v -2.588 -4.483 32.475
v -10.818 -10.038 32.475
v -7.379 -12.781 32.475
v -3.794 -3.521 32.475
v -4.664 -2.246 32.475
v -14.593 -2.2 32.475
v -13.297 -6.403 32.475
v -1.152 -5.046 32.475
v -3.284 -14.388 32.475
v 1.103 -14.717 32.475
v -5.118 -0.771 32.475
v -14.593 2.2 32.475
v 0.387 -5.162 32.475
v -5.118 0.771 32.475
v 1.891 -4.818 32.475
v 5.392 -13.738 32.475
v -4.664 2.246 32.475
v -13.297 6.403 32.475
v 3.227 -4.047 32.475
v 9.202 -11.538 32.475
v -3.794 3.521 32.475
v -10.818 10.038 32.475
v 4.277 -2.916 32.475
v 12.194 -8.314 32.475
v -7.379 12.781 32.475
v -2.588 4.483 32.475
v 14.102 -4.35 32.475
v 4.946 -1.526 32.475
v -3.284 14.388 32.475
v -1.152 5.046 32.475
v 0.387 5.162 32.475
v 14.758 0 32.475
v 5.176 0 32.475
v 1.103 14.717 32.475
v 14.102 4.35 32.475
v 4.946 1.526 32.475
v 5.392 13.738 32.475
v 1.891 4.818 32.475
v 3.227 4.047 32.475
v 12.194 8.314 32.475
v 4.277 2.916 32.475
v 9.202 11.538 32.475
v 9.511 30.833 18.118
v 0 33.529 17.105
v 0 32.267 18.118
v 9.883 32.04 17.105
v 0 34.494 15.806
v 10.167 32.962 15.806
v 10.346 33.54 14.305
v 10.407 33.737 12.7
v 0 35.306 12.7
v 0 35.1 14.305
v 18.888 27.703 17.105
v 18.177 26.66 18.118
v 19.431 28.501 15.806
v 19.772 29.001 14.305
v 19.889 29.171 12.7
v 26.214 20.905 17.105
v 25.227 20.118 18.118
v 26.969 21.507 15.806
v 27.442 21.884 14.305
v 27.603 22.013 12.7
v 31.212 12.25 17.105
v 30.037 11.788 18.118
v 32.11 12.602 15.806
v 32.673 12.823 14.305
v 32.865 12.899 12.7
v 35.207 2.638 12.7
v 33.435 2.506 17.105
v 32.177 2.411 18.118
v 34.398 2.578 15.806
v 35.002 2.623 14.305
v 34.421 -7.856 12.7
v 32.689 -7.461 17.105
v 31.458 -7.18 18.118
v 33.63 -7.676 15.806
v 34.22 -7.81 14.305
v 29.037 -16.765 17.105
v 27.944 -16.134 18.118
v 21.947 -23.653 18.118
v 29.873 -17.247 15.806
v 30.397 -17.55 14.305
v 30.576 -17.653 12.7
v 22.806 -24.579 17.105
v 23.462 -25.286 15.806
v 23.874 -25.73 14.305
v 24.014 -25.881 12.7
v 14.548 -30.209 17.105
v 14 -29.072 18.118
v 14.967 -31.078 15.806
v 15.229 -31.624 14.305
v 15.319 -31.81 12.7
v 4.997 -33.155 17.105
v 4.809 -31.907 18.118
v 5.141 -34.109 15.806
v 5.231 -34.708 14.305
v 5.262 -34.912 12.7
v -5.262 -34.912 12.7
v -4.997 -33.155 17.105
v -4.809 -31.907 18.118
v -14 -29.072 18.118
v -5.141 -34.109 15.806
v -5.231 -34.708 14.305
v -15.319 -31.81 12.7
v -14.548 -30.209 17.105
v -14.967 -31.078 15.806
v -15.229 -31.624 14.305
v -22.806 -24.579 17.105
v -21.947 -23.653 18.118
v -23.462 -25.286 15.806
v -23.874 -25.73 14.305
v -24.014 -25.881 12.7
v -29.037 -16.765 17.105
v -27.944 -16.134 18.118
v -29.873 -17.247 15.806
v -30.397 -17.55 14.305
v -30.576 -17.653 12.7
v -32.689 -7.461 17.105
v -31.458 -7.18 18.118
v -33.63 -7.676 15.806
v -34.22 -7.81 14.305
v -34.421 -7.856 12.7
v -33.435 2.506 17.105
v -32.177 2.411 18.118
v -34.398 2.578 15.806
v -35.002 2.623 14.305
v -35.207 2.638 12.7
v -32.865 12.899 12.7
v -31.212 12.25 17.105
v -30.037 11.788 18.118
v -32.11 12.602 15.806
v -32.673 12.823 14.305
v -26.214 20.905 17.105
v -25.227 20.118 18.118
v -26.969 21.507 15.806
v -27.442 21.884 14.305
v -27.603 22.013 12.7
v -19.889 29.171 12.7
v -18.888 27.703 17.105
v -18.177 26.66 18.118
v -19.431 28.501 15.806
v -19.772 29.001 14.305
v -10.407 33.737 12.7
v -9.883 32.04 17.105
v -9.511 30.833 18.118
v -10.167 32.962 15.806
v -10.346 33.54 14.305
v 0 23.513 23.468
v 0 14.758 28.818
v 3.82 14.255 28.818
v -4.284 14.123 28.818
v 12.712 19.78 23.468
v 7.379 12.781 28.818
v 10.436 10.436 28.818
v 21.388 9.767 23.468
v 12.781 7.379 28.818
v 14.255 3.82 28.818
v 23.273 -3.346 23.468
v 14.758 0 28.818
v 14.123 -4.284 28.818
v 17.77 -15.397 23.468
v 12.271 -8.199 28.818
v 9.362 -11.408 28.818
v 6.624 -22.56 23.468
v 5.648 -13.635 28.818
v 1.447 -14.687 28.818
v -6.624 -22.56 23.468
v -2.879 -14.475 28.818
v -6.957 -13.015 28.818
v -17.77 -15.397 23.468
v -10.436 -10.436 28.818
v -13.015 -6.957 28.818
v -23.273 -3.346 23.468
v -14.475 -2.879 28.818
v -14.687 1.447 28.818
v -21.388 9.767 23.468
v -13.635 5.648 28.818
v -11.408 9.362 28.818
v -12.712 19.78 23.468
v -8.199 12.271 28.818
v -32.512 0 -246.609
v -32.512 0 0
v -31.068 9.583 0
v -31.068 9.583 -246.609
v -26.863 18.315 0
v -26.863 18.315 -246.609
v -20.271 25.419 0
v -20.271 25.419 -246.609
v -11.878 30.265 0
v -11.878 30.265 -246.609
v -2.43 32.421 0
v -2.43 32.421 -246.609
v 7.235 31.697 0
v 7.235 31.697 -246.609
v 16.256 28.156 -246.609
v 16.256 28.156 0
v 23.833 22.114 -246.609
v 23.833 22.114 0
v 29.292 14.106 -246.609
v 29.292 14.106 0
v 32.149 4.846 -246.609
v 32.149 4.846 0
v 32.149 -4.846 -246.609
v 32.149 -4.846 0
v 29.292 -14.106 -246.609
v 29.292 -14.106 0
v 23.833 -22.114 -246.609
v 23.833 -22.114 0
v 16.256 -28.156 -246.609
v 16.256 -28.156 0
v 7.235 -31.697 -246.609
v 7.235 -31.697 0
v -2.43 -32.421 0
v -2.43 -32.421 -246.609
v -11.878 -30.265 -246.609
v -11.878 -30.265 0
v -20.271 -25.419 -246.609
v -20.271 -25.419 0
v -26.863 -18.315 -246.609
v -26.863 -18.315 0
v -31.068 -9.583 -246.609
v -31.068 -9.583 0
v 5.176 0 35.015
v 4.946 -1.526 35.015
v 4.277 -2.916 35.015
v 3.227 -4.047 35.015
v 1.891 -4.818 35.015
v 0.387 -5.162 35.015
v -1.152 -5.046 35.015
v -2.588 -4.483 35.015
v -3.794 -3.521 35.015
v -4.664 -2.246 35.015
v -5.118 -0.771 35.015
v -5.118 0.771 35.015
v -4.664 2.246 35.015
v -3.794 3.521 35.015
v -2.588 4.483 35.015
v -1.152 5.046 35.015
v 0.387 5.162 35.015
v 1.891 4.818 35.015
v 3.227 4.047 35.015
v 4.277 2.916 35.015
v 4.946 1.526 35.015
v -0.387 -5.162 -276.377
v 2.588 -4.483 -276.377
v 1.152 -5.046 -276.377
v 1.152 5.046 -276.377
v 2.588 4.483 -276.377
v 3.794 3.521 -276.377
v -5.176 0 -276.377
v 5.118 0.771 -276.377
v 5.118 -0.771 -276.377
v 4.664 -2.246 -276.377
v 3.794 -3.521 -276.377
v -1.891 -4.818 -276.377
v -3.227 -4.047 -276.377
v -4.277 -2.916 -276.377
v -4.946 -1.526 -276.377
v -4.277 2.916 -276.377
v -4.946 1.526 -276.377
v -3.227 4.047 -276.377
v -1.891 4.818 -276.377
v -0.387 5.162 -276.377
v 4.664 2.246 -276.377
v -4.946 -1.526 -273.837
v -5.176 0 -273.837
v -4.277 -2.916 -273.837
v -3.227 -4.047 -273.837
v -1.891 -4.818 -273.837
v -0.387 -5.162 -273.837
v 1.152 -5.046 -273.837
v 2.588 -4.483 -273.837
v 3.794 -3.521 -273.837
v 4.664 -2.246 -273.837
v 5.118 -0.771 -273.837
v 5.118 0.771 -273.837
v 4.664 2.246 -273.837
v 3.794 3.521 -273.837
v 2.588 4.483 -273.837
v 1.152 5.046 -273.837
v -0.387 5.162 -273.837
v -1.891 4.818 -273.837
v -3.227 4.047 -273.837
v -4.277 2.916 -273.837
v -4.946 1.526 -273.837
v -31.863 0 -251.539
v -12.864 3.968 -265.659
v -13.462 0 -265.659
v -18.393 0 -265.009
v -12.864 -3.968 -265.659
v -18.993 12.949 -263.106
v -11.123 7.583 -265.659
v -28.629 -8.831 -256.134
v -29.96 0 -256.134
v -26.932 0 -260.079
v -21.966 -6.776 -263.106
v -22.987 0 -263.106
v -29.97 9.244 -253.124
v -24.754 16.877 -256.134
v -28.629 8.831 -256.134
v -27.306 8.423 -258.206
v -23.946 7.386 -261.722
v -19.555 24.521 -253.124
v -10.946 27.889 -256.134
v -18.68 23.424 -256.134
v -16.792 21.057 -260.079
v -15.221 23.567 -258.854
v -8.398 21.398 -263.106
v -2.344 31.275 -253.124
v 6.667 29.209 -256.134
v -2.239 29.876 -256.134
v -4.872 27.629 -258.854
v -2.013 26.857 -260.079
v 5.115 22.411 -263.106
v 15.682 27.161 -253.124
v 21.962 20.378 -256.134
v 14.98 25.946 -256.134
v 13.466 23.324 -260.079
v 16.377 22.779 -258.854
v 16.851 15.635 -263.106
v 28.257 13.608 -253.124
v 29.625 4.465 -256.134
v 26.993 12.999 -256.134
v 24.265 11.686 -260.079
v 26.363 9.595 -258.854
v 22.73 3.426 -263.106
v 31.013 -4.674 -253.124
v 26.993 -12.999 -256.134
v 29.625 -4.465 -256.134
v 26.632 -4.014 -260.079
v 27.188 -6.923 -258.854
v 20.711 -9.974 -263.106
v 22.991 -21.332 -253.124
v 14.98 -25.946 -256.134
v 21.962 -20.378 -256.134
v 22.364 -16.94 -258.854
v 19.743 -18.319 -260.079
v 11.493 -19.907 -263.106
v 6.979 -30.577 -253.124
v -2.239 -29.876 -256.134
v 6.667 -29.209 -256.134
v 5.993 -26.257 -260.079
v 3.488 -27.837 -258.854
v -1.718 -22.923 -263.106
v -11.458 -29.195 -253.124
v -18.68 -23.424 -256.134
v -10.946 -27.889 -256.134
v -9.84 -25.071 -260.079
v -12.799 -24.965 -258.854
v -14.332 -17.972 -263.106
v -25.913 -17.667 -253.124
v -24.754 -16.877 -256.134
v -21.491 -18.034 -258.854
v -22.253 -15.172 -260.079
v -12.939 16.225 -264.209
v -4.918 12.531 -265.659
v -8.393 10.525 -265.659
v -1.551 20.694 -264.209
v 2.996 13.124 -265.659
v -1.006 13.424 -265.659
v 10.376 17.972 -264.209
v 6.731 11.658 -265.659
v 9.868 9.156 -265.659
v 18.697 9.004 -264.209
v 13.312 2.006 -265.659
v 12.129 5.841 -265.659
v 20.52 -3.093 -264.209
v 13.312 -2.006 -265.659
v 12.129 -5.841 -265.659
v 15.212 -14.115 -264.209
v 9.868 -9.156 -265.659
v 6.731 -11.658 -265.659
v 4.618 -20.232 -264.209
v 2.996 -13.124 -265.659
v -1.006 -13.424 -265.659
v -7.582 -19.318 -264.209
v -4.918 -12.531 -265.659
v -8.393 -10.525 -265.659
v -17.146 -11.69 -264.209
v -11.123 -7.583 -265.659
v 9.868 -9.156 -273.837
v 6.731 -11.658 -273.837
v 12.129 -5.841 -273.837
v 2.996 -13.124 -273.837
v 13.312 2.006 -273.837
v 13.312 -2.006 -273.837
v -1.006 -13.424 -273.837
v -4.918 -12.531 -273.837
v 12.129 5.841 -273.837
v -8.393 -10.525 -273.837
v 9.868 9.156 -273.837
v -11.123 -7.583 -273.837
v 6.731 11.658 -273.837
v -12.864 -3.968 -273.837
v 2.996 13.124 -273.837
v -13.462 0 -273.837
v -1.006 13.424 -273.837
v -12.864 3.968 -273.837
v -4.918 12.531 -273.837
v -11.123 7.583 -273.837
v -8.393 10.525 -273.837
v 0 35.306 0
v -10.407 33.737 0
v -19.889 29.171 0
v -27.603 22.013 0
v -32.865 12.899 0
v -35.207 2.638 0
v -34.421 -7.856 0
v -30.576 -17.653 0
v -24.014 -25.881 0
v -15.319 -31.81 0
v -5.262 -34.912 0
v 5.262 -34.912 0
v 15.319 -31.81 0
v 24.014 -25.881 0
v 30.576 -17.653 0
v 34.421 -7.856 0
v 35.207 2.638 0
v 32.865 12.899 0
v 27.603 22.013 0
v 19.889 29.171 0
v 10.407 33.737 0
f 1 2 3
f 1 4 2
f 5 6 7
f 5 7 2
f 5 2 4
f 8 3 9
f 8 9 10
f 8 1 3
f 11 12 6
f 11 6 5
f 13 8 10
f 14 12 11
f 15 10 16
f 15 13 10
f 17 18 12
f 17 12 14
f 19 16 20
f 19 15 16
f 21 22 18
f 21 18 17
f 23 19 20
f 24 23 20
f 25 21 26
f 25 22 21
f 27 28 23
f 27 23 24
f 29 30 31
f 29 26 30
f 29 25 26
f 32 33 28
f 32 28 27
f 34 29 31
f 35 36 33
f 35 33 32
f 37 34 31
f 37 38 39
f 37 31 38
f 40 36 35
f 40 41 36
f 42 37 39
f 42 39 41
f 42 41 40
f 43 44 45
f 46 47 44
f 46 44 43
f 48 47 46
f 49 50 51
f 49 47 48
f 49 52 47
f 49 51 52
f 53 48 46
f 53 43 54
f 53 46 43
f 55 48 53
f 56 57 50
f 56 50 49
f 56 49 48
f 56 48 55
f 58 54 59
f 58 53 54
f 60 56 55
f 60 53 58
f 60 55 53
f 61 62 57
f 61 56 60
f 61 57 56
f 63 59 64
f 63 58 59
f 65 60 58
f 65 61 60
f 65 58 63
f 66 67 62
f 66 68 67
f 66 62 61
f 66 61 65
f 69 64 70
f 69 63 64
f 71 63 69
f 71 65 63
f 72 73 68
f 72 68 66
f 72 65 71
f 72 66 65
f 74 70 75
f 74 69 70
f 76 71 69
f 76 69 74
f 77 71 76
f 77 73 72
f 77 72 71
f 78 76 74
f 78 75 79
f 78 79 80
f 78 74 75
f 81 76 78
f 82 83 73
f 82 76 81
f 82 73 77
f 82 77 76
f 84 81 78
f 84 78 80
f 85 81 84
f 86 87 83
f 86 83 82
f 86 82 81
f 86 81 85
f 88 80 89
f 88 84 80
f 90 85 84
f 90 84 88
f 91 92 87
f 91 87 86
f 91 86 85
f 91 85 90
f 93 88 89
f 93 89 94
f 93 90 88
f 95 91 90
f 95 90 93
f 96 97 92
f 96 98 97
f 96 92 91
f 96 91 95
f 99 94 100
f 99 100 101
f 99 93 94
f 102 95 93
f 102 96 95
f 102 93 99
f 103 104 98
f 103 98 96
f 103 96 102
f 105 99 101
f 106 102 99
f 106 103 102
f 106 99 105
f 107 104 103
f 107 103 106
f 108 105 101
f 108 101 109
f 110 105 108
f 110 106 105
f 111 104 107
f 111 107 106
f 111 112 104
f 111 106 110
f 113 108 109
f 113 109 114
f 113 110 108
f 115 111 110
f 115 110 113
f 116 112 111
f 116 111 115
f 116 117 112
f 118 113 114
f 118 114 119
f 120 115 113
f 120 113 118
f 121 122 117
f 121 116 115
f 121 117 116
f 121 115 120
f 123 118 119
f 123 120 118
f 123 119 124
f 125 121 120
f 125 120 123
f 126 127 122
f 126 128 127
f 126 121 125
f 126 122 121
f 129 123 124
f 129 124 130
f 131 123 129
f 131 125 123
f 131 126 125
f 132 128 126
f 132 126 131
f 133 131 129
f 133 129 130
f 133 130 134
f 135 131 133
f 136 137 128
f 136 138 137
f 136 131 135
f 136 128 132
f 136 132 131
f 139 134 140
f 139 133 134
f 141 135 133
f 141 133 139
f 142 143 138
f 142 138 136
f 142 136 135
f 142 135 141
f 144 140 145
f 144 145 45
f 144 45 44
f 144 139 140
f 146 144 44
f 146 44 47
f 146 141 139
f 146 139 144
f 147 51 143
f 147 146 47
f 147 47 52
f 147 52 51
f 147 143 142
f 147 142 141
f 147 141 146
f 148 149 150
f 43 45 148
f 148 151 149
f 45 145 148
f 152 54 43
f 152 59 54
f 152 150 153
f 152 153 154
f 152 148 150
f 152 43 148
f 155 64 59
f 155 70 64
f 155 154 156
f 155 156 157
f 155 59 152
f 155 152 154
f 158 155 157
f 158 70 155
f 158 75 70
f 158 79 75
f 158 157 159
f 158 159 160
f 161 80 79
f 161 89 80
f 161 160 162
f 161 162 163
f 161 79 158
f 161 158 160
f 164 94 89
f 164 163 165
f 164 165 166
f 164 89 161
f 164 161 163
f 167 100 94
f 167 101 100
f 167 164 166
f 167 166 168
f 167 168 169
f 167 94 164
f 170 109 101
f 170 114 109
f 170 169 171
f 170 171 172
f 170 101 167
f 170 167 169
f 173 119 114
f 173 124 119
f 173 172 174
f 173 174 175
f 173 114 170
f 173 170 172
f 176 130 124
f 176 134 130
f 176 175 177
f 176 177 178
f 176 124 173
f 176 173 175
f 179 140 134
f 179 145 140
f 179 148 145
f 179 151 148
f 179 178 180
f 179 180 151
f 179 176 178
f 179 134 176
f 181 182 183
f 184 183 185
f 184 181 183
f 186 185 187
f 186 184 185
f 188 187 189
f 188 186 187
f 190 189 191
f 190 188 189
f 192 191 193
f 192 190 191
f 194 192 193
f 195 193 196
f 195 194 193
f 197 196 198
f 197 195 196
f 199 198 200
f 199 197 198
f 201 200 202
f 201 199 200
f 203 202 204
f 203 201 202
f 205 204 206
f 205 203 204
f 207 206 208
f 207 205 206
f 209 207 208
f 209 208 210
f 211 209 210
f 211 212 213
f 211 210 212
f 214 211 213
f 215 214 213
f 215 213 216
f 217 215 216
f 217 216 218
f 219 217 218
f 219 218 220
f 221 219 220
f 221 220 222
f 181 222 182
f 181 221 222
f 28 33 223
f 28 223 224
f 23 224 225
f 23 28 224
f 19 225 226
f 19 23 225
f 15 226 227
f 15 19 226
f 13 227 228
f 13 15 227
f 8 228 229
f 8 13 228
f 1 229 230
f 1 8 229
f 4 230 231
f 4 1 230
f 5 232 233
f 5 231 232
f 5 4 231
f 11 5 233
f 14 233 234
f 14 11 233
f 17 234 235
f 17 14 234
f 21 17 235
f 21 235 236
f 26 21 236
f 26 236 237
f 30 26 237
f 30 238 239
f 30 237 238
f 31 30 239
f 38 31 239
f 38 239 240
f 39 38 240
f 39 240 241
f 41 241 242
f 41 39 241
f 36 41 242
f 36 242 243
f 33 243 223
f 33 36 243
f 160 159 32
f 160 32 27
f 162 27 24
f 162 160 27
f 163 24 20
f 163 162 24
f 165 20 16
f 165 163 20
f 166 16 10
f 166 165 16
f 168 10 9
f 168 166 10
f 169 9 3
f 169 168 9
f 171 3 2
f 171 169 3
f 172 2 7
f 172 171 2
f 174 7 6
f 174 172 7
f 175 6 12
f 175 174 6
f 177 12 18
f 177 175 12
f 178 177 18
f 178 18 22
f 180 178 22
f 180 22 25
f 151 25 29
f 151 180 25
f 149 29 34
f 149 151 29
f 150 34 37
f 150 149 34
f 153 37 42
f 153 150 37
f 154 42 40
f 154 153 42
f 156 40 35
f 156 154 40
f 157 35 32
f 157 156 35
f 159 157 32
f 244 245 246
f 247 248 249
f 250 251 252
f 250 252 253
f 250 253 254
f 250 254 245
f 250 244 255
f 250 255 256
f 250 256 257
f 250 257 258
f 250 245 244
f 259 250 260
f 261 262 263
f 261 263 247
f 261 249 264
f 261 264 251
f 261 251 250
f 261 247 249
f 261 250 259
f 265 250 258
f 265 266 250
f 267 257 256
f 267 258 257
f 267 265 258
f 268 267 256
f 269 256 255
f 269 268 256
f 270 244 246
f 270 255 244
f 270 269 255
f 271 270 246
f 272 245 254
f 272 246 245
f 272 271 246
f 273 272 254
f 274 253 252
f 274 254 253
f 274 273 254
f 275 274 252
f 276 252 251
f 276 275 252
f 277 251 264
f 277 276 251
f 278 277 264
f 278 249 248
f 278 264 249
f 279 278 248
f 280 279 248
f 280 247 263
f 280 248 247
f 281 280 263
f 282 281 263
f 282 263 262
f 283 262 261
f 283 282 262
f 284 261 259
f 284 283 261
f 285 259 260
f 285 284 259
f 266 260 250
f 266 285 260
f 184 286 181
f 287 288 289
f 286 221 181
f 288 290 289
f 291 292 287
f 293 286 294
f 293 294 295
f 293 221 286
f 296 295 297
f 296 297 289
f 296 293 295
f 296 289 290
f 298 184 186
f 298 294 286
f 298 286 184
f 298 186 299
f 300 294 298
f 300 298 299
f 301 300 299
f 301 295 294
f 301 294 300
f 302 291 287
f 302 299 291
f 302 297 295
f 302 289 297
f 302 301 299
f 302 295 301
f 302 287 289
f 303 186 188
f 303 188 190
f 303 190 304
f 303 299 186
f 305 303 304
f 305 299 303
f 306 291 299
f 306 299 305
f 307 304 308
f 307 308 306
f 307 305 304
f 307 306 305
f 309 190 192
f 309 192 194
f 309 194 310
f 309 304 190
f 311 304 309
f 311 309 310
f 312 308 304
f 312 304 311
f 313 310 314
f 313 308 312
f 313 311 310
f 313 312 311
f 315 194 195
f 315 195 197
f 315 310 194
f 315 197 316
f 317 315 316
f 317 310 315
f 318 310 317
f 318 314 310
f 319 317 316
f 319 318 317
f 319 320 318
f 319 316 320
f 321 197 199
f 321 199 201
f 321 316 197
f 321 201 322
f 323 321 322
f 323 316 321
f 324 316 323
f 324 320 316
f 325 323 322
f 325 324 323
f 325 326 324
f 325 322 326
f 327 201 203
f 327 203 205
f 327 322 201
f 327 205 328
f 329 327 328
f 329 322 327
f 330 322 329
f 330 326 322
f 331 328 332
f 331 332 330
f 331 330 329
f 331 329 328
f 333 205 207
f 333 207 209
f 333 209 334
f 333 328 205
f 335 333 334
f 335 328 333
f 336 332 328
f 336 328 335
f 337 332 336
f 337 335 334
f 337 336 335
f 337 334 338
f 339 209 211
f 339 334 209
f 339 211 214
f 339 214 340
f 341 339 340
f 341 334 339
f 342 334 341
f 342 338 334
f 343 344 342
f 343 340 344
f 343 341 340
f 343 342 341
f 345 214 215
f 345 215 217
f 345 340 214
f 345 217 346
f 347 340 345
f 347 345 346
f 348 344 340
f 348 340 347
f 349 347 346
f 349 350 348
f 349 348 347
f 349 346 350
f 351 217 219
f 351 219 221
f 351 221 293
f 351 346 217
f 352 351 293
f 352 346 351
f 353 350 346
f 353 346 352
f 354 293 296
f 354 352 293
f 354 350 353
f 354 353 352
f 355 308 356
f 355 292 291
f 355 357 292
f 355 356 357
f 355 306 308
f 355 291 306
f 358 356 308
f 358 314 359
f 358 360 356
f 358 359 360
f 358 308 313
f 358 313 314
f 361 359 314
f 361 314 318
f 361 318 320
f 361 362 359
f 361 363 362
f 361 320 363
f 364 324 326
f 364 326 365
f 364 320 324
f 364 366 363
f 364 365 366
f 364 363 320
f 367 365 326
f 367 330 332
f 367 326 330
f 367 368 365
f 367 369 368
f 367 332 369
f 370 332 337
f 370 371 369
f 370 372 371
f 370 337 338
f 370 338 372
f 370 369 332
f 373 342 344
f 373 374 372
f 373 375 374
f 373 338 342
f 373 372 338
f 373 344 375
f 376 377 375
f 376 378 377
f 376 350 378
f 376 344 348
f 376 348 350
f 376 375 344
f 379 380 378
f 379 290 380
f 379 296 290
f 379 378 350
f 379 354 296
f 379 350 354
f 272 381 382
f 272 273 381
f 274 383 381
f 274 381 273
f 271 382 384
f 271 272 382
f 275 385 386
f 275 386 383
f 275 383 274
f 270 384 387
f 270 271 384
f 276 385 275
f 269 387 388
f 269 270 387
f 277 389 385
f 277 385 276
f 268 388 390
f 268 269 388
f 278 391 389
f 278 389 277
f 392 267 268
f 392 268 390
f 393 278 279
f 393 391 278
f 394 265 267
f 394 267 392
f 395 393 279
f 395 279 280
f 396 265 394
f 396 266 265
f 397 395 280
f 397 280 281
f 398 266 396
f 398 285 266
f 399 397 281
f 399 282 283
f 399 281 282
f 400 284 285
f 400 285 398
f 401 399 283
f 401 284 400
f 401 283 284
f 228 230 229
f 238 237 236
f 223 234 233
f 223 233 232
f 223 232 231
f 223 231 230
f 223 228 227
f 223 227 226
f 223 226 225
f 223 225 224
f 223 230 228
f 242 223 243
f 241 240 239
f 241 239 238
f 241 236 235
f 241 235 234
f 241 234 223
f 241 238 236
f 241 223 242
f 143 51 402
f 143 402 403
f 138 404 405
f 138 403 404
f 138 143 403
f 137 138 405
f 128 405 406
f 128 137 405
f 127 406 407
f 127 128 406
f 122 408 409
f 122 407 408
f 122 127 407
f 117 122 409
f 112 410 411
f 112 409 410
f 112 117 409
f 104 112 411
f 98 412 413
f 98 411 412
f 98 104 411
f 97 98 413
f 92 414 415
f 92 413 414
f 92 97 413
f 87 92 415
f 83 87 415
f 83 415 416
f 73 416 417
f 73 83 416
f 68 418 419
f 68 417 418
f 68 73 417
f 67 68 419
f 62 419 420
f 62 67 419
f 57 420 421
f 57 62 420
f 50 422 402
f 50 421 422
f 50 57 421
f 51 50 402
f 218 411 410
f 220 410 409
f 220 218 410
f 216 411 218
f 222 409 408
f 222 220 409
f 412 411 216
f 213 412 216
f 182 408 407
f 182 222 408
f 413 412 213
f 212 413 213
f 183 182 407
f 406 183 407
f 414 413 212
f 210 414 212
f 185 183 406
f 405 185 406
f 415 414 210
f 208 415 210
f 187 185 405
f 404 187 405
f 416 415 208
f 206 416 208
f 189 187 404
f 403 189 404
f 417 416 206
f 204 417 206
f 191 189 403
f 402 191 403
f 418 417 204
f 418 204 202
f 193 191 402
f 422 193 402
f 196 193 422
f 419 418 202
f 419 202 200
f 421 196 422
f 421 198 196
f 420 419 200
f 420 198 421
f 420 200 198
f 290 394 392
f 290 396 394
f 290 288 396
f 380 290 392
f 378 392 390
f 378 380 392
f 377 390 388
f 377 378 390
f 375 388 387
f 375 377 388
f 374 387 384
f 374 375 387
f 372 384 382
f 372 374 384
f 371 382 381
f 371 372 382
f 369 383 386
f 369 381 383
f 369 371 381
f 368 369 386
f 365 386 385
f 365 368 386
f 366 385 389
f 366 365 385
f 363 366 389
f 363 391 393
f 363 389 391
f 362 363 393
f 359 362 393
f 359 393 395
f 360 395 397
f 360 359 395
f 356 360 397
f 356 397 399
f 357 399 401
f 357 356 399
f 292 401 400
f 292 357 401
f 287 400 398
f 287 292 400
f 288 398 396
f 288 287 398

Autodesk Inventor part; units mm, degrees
ref_plane "XZ Plane" through (0, 0, 0) normal (0, 1, 0) x (-1, 0, 0)
ref_plane "XY Plane" through (0, 0, 0) normal (0, 0, 1) x (1, 0, 0)
sketch "Sketch1" plane through (0, 0, 0) normal (0, 1, 0) x (-1, 0, 0)
  line L0 (0, 0) -> (0, -394.9191)
  line L1 (0, 0) -> (32.512, 0)
  line L2 (32.512, 0) -> (32.512, -265.6586)
  line L3 (32.512, -265.6586) -> (0, -265.6586)
  dimension "d0" = 32.512
  dimension "d1" = 265.6586
revolve "Revolution1" add sketch "Sketch1" angle 360 about axis through (0, 0, 0) along (0, 0, -1)
fillet "Fillet1" radius 19.05 1 edges at (32.512, 0, -265.6586)
sketch "Sketch2" plane through (0, 0, 0) normal (1, 0, 0) x (0, 1, 0)
  line L0 (0, 0) -> (35.306, 0)
  line L1 (-32.512, 0) -> (32.512, 0) projected
  line L2 (35.306, 0) -> (35.306, 19.05)
  line L3 (35.306, 19.05) -> (0, 19.05)
  line L4 (0, 19.05) -> (0, 0)
  dimension "d4" = 35.306
  dimension "d5" = 19.05
revolve "Revolution2" add sketch "Sketch2" angle 360 about axis through (0, 0, 19.05) along (0, 0, -1)
fillet "Fillet2" radius 6.35 1 edges at (0, -35.306, 19.05)
sketch "Sketch3" plane through (0, 0, 0) normal (1, 0, 0) x (0, 1, 0)
  arc A0 (35.306, 12.7) -> (28.956, 19.05) centre (28.956, 12.7) ccw projected
  line L0 (32.267, 18.1184) -> (14.7581, 28.8176)
  line L1 (14.7581, 28.8176) -> (0, 28.8176)
  line L2 (0, 28.8176) -> (0, 19.05)
  line L3 (-28.956, 19.05) -> (28.956, 19.05) projected
  point P0 (0, 0)
revolve "Revolution3" add sketch "Sketch3" angle 360 about axis through (0, 0, 28.8176) along (0, 0, -1)
sketch "Sketch4" plane through (0, 0, 28.8176) normal (0, 0, 1) x (1, 0, 0)
  circle A0 centre (0, 0) radius 14.7581 projected
extrude "Extrusion1" add sketch "Sketch4" along normal blind 3.6576
sketch "Sketch5" plane through (0, 0, -265.6586) normal (0, 0, -1) x (-1, 0, 0)
  circle A0 centre (0, 0) radius 13.462 projected
extrude "Extrusion2" add sketch "Sketch5" along normal blind 8.1788
sketch "Sketch6" plane through (0, 0, 32.4752) normal (0, 0, 1) x (1, 0, 0)
  circle A0 centre (0, 0) radius 14.7581 projected
  circle A1 centre (0, 0) radius 5.1761
extrude "Extrusion3" add sketch "Sketch6" along normal blind 2.54 contours A1
sketch "Sketch7" plane through (0, 0, -273.8374) normal (0, 0, -1) x (-1, 0, 0)
  circle A0 centre (0, 0) radius 5.1761 projected
extrude "Extrusion4" add sketch "Sketch7" along normal blind 2.54
ref_plane "Work Plane1" through (32.512, 0, -132.8293) normal (1, 0, 0) x (0, 1, 0)
sketch "Sketch8" plane through (32.512, 0, -132.8293) normal (1, 0, 0) x (0, 1, 0)
  line L0 (25.1645, 74.2307) -> (25.1645, -47.9866) construction
  line L1 (25.1645, -47.9866) -> (-21.6706, -47.9866) construction
  line L2 (-21.6706, -47.9866) -> (-21.6706, 74.2307) construction
  line L3 (-21.6706, 74.2307) -> (25.1645, 74.2307) construction
  point P0 (0, 132.8293)
decal "Decal1"
properties part number "AVT-PP-35" material "Steel"
